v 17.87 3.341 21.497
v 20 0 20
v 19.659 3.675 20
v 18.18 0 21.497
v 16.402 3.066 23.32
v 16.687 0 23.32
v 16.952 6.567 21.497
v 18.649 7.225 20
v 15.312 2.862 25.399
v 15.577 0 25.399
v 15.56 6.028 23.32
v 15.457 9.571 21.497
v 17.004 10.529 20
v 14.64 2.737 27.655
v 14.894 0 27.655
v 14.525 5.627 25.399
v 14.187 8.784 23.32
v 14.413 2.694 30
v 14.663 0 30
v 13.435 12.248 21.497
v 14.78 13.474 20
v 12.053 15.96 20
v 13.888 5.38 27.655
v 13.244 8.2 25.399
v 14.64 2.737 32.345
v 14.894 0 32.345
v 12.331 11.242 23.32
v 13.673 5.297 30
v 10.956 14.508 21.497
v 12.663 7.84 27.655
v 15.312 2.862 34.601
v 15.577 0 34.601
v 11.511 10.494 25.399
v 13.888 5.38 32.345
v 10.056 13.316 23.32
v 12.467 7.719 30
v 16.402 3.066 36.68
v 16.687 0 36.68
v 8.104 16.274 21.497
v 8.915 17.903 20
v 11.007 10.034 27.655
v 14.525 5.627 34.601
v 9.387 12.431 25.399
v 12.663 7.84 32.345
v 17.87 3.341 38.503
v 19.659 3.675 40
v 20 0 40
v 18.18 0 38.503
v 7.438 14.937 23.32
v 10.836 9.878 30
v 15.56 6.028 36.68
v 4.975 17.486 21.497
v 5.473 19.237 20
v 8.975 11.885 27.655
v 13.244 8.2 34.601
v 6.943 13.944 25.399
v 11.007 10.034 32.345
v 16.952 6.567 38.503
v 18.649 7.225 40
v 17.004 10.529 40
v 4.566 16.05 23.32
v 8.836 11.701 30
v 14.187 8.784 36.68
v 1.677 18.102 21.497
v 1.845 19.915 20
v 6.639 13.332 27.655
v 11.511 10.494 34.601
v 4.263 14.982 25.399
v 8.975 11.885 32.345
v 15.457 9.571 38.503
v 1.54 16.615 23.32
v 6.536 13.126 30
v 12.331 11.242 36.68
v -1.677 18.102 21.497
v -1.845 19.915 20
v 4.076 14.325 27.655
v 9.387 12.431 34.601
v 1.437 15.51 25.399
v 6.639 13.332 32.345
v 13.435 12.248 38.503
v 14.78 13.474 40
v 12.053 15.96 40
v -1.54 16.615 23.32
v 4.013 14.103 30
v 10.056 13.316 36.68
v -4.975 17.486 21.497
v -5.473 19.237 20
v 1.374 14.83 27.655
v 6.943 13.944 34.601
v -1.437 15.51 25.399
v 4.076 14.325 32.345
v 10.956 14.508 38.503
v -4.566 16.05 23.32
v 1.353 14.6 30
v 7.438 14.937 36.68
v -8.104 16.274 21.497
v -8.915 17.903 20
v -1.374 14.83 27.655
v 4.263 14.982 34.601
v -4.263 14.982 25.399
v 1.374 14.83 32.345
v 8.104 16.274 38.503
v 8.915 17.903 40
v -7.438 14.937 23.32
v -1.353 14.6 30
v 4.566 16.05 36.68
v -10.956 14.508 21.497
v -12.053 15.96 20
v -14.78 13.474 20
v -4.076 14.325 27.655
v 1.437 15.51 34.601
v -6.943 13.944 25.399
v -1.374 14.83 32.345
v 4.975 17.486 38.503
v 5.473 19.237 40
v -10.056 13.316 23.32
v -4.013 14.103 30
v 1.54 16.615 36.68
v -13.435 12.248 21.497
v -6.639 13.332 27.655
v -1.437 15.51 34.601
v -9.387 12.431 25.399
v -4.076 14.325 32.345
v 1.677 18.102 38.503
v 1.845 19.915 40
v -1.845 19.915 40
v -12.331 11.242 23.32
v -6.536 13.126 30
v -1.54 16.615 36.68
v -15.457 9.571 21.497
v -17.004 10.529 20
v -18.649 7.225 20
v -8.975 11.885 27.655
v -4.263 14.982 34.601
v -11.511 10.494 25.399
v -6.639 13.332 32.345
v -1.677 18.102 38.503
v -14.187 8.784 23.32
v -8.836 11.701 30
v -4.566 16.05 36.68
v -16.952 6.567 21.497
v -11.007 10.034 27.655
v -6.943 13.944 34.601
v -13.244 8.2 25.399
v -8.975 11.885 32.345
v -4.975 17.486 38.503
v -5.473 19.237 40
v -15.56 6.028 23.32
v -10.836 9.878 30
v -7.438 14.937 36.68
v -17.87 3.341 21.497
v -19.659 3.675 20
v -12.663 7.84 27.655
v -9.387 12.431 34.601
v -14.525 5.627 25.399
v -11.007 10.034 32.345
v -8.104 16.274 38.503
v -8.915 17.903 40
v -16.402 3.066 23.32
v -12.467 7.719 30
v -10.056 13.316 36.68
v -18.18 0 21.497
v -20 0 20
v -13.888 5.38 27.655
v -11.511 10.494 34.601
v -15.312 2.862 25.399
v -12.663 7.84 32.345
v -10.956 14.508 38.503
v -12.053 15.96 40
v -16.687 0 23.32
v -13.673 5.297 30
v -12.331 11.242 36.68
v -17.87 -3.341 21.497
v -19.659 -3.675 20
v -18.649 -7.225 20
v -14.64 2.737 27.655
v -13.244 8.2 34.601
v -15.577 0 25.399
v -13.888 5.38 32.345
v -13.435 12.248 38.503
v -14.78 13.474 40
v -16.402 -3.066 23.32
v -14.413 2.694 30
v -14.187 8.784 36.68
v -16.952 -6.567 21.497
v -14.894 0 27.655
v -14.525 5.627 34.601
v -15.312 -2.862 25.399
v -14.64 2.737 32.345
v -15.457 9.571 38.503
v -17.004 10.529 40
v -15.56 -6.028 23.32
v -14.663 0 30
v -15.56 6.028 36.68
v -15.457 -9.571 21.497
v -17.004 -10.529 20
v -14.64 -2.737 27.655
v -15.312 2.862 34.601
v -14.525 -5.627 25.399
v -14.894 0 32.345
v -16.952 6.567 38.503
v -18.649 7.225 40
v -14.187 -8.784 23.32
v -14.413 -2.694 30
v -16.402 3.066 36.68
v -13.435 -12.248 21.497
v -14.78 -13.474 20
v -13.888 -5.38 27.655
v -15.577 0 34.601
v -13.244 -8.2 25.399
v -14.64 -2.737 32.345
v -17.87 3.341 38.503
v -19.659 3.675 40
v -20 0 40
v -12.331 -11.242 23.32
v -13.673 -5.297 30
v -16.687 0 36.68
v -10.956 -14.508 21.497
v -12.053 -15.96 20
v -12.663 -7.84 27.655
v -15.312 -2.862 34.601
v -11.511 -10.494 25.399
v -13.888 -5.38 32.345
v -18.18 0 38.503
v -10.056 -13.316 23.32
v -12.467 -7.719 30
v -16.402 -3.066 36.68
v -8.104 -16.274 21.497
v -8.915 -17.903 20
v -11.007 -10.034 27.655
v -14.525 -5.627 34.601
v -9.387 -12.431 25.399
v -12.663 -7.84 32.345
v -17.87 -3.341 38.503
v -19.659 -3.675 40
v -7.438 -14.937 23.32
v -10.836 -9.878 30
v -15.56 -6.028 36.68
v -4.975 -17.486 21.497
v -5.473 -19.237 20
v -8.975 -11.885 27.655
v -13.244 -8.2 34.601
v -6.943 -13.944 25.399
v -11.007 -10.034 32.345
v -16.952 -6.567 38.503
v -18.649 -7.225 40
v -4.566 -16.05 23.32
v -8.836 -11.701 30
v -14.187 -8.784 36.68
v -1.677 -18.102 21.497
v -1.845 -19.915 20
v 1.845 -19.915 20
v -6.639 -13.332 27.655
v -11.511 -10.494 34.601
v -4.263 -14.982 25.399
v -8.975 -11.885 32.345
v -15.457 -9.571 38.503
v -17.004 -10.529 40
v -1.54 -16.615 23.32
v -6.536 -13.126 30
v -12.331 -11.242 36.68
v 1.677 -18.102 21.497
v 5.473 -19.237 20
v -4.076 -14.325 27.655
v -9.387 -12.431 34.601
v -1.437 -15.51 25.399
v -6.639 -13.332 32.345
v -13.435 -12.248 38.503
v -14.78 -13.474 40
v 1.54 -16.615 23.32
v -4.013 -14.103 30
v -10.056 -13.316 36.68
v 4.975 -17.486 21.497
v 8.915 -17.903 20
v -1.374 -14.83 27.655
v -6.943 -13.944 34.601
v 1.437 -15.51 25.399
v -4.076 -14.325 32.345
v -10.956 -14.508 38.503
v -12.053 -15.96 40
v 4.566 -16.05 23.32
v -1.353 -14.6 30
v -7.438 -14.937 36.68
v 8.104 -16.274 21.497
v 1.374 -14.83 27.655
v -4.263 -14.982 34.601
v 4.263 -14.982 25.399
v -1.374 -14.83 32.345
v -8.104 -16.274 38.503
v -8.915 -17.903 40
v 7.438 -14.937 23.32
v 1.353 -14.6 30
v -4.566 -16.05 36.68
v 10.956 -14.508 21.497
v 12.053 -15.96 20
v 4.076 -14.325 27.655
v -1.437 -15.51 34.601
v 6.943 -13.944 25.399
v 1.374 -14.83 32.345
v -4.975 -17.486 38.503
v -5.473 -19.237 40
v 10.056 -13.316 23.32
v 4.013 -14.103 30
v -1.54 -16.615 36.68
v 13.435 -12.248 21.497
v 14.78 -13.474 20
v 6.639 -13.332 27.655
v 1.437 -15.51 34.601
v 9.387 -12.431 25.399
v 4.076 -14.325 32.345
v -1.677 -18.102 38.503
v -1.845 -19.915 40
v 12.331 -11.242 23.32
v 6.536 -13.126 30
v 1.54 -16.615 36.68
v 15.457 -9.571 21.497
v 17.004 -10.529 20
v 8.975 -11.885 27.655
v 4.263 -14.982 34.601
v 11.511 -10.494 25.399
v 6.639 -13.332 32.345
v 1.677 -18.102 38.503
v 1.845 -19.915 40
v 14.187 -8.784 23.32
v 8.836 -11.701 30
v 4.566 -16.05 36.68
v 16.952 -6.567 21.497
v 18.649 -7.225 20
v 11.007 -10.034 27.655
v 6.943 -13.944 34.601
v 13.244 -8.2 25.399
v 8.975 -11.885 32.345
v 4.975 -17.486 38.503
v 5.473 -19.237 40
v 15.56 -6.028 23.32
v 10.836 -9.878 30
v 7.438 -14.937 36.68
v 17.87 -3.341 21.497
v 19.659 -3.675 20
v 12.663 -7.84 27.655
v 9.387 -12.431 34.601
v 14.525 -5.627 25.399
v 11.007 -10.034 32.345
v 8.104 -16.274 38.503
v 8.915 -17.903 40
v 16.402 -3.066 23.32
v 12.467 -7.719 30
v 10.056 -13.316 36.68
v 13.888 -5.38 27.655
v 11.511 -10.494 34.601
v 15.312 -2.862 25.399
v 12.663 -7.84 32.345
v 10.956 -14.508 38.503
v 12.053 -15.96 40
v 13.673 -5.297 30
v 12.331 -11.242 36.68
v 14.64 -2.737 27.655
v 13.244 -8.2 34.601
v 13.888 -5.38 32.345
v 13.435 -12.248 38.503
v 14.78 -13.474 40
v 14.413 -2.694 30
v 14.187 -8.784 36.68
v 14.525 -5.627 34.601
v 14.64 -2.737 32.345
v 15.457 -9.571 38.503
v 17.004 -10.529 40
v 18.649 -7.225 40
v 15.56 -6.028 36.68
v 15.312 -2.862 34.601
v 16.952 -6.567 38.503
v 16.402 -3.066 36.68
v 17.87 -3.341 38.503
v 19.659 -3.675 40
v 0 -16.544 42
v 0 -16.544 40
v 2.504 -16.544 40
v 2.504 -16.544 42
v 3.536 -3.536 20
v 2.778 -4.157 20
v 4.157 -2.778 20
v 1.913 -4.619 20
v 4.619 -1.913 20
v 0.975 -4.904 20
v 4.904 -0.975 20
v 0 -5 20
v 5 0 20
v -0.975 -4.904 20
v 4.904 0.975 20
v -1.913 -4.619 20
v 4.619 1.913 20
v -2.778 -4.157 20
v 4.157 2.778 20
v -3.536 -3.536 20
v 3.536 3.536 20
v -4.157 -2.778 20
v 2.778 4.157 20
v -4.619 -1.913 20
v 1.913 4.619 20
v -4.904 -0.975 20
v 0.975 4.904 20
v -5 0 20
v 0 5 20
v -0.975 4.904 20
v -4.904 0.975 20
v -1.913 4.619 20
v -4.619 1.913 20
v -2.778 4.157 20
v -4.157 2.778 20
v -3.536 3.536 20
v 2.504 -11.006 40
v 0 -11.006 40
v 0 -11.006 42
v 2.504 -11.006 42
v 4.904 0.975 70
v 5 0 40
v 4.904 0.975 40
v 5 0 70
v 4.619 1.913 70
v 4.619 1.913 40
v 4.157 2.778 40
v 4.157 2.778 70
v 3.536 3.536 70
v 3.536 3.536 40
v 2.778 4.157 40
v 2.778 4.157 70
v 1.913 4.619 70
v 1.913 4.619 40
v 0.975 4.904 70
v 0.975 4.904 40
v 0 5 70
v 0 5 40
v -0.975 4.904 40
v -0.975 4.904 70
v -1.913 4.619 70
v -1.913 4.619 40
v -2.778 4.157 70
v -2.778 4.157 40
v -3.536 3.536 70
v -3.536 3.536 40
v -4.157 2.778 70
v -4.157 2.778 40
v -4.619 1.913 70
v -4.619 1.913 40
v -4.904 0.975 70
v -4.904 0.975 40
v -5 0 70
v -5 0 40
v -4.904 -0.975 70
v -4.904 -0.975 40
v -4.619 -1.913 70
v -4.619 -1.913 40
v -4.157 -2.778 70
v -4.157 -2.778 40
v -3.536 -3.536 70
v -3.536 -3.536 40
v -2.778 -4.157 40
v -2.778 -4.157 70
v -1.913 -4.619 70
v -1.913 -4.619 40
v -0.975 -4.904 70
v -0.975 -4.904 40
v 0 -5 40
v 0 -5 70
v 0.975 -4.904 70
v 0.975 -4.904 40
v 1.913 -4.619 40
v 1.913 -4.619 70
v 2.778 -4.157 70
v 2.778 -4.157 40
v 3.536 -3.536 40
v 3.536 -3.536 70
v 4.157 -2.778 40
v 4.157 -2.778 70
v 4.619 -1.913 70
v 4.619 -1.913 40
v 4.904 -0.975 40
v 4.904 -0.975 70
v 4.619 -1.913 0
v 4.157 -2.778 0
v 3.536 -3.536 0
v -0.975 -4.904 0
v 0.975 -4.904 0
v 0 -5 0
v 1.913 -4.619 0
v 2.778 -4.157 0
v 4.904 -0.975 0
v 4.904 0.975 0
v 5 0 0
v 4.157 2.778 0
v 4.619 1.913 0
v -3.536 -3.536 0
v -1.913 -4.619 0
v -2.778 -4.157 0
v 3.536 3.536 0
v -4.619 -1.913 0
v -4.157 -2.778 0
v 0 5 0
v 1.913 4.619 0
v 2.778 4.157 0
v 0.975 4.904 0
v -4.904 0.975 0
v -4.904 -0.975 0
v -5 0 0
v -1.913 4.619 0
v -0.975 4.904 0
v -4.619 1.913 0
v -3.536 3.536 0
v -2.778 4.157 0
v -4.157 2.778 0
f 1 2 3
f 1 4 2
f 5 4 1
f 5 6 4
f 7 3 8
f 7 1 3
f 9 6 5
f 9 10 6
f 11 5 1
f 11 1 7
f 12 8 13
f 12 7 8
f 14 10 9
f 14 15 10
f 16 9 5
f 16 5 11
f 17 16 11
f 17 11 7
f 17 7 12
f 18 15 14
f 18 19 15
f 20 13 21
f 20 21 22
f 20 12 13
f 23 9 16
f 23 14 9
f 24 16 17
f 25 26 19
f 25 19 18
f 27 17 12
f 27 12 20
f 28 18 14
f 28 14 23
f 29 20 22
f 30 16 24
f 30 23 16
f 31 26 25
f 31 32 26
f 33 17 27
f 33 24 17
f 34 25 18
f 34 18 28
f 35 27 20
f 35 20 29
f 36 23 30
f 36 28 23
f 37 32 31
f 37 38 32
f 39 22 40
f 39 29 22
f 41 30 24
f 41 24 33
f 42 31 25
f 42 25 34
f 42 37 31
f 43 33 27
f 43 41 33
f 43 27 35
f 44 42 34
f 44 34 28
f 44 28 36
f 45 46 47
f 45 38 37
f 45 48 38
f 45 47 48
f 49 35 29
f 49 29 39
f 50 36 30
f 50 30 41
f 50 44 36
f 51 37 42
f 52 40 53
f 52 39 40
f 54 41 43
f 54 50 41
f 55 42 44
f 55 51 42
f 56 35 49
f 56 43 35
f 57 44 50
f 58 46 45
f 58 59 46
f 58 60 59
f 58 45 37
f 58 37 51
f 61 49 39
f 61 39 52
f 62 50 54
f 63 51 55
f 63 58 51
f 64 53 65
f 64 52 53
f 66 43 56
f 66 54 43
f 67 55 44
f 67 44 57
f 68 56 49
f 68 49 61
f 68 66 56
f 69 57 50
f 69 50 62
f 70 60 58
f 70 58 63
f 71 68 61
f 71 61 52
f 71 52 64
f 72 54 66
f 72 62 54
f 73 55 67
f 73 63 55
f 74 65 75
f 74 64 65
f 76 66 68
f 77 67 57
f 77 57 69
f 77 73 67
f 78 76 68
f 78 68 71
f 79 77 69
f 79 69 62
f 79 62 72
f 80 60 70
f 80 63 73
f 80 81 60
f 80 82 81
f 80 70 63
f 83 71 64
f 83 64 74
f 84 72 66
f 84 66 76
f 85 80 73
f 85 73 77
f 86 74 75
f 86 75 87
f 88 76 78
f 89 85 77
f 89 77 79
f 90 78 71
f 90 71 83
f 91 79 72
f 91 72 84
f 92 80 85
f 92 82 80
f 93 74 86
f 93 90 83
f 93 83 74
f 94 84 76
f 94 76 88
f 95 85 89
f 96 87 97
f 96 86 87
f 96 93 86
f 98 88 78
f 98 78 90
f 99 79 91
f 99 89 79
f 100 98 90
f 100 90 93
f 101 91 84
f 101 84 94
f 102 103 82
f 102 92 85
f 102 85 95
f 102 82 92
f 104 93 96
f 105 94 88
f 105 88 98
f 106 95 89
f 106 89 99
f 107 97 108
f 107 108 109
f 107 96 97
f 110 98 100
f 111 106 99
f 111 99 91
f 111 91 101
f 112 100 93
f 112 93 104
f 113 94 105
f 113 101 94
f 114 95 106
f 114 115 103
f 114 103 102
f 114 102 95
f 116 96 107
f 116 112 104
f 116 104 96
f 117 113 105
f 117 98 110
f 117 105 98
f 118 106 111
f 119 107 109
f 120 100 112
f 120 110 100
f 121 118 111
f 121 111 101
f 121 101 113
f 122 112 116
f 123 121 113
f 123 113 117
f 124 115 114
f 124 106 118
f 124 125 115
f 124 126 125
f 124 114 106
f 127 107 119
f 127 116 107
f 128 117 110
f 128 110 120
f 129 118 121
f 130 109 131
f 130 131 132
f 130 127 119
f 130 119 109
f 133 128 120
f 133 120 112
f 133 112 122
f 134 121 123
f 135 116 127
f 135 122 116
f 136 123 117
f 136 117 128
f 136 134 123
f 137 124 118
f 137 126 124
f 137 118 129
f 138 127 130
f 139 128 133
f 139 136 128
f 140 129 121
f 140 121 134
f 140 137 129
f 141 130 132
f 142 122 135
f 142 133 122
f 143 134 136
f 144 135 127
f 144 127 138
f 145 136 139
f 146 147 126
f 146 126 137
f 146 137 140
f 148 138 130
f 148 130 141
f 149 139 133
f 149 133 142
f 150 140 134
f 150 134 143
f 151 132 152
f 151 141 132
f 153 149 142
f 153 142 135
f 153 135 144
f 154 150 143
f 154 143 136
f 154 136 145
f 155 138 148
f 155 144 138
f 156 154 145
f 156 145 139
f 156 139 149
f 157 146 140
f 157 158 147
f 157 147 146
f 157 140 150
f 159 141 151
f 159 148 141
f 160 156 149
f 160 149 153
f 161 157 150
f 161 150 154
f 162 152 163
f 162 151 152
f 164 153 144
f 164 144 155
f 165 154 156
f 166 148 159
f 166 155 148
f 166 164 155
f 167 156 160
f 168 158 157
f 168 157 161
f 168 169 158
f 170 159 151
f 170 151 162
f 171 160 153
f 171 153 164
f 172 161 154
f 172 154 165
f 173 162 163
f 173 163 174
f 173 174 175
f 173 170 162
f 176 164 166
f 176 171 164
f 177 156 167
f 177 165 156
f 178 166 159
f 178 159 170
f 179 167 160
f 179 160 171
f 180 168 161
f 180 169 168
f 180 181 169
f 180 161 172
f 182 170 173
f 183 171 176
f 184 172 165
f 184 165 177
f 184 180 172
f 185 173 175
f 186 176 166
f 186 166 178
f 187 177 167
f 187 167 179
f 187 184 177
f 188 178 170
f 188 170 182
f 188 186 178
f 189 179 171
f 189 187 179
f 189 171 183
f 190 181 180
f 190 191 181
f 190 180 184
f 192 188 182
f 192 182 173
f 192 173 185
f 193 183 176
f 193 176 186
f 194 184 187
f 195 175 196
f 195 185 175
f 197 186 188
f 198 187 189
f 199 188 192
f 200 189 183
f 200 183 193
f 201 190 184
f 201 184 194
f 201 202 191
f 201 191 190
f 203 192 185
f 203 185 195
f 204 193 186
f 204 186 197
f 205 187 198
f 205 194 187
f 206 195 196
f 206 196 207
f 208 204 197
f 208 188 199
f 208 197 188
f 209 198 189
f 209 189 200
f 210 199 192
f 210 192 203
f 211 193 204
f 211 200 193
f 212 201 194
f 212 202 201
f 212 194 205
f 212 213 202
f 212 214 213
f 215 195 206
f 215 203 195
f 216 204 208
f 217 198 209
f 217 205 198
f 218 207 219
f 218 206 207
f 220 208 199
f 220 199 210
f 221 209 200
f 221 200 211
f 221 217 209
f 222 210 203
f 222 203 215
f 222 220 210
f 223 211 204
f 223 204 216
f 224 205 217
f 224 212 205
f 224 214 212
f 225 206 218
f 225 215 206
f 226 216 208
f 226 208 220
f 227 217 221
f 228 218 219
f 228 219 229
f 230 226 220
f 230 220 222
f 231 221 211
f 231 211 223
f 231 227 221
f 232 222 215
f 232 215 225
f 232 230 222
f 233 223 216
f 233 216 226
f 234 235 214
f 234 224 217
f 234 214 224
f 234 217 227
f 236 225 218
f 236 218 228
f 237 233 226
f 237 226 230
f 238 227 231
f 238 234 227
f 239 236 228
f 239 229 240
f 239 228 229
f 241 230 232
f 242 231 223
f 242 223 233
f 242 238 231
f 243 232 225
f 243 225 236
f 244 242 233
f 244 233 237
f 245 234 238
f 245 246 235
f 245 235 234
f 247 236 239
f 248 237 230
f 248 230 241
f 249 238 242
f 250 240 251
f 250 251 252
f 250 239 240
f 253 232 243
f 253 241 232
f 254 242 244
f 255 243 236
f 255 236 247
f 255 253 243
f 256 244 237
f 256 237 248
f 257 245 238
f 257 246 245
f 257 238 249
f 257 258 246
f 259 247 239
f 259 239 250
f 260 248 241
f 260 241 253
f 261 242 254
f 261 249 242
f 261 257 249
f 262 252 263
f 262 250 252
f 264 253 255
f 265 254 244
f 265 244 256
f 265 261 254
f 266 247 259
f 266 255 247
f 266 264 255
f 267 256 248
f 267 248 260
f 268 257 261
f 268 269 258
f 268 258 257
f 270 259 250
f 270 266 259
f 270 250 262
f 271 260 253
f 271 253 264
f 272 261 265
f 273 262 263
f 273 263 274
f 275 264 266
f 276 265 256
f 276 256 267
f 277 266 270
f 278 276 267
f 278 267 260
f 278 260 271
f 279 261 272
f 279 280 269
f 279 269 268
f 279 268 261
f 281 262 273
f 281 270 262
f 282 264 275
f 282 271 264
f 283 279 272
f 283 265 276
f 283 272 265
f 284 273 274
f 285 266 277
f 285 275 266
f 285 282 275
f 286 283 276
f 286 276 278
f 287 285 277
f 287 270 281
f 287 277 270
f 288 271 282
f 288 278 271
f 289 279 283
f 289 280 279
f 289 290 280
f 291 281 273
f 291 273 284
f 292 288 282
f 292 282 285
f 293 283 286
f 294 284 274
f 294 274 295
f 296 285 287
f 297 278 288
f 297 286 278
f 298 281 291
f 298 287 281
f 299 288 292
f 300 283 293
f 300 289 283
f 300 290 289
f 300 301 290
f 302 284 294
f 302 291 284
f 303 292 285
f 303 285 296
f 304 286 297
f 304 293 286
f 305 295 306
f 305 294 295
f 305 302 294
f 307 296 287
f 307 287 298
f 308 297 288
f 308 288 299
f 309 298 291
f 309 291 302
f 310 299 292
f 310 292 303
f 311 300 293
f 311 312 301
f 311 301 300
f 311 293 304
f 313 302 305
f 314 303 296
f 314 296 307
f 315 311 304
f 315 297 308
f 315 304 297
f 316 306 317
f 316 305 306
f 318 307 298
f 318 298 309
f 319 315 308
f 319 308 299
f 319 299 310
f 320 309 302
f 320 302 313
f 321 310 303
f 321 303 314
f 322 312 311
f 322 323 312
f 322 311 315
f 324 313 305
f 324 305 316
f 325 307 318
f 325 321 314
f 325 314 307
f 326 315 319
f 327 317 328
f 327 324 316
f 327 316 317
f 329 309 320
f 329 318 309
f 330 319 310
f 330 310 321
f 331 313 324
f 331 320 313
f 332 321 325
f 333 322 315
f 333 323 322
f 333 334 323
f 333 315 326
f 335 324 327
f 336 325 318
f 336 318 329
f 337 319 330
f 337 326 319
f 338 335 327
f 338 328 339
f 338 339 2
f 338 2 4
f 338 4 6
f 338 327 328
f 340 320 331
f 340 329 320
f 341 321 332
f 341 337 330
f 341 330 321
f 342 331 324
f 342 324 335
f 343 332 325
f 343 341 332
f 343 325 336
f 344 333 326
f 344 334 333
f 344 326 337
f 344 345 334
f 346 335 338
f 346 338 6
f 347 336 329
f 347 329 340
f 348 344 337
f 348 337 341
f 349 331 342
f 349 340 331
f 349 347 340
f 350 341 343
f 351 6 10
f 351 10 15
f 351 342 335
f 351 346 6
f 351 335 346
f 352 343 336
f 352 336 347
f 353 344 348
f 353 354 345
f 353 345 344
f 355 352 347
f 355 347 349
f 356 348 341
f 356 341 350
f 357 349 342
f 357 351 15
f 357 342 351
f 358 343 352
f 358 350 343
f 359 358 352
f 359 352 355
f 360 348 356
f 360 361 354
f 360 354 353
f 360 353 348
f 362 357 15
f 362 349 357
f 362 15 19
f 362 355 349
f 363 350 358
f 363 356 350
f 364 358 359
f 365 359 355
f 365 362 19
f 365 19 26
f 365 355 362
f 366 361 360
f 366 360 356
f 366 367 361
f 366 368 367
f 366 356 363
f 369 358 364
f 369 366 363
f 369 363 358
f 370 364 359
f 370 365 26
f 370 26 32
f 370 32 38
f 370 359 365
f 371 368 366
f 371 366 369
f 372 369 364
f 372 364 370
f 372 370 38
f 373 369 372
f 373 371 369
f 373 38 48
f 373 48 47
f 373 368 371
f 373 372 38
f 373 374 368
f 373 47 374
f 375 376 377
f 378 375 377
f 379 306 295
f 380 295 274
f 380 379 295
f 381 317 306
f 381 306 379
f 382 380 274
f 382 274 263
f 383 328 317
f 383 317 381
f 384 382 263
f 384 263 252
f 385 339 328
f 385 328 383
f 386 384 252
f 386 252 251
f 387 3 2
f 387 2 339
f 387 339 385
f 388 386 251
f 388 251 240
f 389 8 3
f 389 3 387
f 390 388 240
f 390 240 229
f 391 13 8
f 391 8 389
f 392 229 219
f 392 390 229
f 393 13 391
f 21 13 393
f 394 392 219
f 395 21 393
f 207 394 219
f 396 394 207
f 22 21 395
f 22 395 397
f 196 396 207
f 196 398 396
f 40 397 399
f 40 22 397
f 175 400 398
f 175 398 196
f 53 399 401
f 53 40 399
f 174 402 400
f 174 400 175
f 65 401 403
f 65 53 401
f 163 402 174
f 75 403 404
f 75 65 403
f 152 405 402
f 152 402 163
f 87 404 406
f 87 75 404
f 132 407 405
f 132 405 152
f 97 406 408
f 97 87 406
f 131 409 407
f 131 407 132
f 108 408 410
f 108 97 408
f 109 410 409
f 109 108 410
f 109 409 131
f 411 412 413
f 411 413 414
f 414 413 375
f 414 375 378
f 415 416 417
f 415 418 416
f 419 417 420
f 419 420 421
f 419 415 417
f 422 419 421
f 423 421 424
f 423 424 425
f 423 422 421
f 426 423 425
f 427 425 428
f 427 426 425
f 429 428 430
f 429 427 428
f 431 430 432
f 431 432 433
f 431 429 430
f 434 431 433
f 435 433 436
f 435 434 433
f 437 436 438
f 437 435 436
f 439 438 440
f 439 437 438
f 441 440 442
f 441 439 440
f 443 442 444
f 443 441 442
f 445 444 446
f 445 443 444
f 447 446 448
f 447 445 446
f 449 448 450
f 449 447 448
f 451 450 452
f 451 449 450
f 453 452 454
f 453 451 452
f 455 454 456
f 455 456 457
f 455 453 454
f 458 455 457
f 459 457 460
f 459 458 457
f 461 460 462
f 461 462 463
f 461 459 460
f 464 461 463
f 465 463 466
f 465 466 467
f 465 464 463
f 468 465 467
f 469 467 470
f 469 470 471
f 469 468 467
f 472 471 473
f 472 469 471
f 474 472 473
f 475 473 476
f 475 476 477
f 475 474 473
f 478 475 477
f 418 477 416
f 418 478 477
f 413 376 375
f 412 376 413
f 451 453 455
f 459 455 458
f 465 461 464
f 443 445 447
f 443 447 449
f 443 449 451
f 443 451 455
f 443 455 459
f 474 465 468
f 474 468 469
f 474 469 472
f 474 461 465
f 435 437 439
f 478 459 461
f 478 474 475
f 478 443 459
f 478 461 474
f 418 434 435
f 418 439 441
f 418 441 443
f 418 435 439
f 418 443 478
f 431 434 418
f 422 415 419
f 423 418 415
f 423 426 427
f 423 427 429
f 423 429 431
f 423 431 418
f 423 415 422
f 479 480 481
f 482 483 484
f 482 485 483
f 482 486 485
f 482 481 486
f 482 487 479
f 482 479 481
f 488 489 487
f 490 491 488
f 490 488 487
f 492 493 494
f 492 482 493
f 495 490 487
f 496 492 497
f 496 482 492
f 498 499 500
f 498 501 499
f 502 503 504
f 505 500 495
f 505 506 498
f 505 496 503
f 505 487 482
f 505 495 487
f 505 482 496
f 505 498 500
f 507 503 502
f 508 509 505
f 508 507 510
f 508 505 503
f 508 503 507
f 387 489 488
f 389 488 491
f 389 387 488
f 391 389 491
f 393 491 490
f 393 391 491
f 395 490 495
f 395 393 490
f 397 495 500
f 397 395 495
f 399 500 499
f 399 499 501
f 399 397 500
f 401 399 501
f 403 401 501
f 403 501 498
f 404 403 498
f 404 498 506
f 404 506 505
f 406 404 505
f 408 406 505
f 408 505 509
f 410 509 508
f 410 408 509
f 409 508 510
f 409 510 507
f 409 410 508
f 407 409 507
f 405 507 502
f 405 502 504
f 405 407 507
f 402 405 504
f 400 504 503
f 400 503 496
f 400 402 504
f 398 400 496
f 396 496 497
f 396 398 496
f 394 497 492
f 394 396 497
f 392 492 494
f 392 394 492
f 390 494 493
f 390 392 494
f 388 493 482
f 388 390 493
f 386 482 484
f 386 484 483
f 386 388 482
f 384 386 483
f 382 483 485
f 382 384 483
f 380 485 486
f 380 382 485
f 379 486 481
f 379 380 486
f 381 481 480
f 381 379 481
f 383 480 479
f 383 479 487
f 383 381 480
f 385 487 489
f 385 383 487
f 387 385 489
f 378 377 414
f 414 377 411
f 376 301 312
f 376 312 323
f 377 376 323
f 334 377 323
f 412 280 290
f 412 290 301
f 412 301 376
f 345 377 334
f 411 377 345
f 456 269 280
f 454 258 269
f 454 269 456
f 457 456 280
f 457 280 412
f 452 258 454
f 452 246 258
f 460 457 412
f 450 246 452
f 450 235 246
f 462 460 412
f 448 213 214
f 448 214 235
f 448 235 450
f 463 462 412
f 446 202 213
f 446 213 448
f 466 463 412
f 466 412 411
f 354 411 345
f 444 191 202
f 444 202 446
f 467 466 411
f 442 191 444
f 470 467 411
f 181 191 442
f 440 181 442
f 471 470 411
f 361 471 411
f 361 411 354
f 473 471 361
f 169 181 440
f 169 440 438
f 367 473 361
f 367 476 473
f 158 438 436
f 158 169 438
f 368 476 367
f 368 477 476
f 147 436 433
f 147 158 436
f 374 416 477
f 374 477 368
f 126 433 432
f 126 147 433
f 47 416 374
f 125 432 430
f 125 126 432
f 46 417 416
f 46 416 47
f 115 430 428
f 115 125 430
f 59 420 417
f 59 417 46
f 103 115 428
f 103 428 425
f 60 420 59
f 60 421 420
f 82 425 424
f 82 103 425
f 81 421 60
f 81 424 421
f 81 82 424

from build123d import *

# Parameters (mm, degrees)
F2_W     = 2.503898
F2_H     = 5.537905
F3_DEPTH = 2


with BuildPart() as f1:
    # F0 (on Front) → F1 (revolve)
    with BuildSketch(Plane.XZ):
        with BuildLine():
            Line((0, 70), (0, 0))
            Line((0, 0), (5, 0))
            Line((5, 0), (5, 20))
            Line((5, 20), (20, 20))
            ThreePointArc((20, 20), (14.662927, 30), (20, 40))
            Line((20, 40), (5, 40))
            Line((5, 40), (5, 70))
            Line((5, 70), (0, 70))
        make_face()
    revolve(axis=Axis((0, 0, 35), (0, 0, 1)))

    # F2 (on face) → F3 (join)
    with BuildSketch(Plane.XY.offset(40)):
        with Locations((1.251949, -13.775359)):
            Rectangle(F2_W, F2_H)
    extrude(amount=F3_DEPTH)


solid = f1.part
